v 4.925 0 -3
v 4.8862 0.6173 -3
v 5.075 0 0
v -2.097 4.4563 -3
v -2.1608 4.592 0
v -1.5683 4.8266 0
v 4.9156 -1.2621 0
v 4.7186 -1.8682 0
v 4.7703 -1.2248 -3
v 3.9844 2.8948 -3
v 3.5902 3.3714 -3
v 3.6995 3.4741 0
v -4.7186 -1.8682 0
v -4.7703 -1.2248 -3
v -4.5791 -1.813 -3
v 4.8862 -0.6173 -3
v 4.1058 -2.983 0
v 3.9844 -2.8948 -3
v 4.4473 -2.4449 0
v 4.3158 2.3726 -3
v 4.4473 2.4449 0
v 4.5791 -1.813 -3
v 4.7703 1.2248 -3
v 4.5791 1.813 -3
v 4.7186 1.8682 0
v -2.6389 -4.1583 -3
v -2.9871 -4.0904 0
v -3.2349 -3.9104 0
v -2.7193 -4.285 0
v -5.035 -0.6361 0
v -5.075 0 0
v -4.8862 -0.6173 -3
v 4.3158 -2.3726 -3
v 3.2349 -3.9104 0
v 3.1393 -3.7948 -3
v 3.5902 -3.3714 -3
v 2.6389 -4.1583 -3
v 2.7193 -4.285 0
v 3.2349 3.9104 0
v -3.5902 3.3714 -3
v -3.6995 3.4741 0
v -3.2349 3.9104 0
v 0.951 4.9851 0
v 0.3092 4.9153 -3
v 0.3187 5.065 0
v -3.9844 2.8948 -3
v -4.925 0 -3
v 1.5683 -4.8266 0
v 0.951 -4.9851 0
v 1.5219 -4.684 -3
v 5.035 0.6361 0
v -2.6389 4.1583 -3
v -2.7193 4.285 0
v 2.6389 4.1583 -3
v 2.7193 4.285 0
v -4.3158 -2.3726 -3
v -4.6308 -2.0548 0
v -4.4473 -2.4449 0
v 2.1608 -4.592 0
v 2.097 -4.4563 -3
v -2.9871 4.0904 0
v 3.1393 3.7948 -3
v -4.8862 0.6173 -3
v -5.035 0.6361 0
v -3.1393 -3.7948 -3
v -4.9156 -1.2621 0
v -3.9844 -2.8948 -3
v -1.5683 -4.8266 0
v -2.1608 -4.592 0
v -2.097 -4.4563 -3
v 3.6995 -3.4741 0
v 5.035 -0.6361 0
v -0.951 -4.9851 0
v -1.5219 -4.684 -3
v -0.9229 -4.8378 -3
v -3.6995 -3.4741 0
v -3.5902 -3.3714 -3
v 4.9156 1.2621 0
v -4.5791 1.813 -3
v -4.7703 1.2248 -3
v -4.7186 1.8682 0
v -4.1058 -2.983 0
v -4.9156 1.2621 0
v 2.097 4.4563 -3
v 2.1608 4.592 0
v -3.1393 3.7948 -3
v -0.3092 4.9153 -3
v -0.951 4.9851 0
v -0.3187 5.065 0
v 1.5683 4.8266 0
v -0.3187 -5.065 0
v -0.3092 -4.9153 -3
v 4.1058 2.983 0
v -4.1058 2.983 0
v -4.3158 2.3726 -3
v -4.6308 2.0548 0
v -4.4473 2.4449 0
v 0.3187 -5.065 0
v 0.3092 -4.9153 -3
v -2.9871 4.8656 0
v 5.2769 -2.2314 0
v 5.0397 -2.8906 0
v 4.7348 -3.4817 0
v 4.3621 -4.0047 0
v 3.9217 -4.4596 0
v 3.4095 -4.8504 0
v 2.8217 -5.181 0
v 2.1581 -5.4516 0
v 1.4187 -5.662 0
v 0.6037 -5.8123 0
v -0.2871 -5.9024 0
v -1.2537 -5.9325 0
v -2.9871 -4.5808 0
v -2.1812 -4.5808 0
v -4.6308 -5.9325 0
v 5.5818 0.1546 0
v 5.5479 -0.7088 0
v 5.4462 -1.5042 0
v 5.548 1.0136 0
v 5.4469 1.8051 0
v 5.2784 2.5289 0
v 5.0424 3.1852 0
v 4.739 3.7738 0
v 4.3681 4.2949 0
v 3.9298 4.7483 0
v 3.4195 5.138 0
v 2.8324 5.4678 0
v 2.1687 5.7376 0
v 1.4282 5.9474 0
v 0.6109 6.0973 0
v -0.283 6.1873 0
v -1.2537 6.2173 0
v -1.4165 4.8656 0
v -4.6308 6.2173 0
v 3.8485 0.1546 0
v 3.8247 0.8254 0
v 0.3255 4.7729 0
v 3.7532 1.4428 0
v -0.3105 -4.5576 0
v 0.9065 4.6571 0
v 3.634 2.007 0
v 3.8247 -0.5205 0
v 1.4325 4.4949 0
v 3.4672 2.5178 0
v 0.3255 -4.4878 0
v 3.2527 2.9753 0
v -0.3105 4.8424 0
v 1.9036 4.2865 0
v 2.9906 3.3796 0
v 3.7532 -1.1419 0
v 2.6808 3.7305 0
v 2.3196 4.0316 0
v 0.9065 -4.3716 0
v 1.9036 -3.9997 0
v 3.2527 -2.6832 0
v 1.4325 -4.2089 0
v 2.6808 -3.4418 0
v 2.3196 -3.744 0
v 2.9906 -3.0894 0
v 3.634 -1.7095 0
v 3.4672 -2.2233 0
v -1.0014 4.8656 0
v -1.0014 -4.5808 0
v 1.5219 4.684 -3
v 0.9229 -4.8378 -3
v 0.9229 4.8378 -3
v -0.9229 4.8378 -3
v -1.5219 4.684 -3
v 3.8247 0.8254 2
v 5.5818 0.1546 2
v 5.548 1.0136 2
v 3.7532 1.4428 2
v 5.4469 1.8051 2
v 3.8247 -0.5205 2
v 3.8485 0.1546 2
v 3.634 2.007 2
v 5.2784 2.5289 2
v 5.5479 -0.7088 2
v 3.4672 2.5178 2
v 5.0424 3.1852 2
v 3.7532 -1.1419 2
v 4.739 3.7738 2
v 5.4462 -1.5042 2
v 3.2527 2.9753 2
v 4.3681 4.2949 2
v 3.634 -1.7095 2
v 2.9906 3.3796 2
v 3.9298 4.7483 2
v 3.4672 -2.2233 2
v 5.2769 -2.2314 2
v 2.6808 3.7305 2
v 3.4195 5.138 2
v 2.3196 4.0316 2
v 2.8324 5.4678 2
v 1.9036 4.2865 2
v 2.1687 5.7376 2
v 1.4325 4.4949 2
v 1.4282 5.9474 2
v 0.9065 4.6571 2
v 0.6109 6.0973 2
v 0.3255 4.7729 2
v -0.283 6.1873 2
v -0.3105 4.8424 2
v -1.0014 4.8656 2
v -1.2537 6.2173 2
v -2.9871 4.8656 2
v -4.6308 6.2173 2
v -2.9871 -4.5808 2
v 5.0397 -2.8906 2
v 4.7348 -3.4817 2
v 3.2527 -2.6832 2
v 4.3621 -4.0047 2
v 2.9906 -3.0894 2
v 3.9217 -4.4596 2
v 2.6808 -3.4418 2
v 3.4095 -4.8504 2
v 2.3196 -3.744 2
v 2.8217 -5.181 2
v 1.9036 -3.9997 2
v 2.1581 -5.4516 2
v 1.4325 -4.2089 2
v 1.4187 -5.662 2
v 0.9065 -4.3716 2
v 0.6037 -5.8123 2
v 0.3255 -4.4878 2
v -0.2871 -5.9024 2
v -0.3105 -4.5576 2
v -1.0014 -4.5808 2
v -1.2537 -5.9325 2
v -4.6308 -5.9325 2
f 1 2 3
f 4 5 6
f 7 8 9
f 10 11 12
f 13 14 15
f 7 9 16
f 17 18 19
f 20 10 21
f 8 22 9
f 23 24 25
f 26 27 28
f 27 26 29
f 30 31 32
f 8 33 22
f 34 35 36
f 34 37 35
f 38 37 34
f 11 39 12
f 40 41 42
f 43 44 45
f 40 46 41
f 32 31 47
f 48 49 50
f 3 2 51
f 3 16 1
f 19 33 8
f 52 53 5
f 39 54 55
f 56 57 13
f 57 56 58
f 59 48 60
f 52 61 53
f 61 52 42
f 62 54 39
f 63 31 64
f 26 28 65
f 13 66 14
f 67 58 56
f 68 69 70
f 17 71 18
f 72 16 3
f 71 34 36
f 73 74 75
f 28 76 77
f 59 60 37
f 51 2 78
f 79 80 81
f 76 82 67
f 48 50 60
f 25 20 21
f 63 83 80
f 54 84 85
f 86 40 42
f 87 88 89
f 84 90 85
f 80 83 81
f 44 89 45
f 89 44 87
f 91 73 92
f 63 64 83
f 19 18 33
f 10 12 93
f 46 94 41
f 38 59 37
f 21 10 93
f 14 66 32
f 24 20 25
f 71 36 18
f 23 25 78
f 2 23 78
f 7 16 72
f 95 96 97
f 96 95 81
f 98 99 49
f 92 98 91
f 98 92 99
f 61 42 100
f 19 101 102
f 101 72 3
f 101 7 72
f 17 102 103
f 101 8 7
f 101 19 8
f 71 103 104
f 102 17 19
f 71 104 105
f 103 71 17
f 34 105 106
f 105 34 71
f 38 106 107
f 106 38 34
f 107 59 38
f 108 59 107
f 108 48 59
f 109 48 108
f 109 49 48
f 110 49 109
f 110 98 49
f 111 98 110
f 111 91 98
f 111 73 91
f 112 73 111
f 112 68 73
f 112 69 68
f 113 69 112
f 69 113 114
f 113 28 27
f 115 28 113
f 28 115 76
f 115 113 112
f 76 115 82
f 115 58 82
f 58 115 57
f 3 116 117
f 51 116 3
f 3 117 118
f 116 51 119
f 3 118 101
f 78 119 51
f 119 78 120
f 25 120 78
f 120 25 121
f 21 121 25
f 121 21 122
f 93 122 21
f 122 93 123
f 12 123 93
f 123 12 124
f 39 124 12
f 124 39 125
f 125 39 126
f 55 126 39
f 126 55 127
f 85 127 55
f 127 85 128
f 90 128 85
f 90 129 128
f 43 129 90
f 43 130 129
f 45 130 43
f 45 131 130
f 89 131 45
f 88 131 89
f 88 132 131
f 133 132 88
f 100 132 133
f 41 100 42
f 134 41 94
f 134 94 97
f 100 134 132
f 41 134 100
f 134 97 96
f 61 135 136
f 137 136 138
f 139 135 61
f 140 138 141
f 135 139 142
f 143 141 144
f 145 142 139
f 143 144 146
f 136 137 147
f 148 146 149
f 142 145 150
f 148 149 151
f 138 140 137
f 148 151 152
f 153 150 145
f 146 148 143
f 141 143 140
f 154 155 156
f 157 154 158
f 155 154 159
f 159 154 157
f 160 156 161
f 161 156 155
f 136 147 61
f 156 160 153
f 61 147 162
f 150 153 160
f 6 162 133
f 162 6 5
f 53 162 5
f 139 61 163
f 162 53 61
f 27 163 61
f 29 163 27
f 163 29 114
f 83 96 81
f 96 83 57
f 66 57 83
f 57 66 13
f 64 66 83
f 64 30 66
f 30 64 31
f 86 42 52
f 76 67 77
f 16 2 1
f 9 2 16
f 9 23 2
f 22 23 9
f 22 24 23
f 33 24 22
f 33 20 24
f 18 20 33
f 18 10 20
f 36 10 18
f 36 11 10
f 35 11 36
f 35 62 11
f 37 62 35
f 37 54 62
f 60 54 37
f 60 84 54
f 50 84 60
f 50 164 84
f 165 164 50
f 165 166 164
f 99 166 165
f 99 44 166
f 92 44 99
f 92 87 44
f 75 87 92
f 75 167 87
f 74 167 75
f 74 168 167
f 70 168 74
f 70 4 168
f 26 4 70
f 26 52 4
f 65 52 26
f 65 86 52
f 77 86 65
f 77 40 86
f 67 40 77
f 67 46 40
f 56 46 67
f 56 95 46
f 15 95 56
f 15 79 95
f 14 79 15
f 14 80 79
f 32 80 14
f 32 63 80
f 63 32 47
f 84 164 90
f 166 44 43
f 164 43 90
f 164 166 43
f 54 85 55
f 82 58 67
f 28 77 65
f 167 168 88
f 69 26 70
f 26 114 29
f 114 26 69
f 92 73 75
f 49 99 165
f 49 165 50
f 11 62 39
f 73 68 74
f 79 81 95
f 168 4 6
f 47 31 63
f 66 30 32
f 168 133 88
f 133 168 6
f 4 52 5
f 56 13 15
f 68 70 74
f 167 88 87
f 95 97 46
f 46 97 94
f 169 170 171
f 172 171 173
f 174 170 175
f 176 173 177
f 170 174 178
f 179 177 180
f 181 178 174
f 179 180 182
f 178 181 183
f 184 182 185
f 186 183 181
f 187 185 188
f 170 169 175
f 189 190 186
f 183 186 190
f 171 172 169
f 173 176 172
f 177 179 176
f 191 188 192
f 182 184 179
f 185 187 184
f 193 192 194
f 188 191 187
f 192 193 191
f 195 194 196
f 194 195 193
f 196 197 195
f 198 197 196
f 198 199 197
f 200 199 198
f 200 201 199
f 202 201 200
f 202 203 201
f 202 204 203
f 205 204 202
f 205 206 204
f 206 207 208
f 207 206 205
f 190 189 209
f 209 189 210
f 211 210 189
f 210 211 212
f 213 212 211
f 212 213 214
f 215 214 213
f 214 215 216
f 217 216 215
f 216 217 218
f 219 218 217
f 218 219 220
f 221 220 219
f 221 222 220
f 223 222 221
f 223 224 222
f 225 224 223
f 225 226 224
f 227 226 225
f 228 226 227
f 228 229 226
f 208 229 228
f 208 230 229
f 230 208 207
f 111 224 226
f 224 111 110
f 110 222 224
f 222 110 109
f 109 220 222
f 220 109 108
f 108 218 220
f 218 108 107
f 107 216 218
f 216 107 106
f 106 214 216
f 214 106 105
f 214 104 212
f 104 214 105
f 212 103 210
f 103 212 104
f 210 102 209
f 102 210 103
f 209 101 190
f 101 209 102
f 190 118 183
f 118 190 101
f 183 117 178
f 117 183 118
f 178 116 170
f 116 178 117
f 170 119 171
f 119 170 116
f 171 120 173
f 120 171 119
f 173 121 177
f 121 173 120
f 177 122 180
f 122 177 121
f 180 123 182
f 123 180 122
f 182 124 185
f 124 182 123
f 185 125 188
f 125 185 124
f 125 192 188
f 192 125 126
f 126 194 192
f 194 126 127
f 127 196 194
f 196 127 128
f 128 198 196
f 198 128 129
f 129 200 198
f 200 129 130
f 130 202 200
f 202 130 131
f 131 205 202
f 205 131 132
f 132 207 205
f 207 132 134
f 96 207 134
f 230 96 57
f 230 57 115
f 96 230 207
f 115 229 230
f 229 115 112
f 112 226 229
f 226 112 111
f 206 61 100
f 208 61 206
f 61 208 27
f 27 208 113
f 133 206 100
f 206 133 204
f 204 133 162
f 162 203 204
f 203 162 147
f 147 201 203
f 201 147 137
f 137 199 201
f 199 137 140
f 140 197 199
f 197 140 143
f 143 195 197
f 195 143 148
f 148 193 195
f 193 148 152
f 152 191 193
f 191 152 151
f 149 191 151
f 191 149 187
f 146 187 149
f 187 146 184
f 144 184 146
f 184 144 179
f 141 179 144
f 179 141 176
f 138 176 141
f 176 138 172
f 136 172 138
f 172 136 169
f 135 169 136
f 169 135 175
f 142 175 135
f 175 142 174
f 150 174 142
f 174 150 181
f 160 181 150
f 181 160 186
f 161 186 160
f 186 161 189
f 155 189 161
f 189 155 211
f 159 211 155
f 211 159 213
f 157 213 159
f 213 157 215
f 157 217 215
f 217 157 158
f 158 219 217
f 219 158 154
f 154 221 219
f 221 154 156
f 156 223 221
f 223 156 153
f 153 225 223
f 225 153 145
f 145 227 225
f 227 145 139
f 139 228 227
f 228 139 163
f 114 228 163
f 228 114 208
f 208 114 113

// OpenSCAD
$fn = 50;


difference() {
	union() {
		translate(v = [0, 0, -3.0000000000]) {
			cylinder(h = 3, r1 = 4.9250000000, r2 = 5.0750000000);
		}
		linear_extrude(height = 2) {
			text(font = "Impact", halign = "center", size = 12, text = "D", valign = "center");
		}
	}
	union();
}
